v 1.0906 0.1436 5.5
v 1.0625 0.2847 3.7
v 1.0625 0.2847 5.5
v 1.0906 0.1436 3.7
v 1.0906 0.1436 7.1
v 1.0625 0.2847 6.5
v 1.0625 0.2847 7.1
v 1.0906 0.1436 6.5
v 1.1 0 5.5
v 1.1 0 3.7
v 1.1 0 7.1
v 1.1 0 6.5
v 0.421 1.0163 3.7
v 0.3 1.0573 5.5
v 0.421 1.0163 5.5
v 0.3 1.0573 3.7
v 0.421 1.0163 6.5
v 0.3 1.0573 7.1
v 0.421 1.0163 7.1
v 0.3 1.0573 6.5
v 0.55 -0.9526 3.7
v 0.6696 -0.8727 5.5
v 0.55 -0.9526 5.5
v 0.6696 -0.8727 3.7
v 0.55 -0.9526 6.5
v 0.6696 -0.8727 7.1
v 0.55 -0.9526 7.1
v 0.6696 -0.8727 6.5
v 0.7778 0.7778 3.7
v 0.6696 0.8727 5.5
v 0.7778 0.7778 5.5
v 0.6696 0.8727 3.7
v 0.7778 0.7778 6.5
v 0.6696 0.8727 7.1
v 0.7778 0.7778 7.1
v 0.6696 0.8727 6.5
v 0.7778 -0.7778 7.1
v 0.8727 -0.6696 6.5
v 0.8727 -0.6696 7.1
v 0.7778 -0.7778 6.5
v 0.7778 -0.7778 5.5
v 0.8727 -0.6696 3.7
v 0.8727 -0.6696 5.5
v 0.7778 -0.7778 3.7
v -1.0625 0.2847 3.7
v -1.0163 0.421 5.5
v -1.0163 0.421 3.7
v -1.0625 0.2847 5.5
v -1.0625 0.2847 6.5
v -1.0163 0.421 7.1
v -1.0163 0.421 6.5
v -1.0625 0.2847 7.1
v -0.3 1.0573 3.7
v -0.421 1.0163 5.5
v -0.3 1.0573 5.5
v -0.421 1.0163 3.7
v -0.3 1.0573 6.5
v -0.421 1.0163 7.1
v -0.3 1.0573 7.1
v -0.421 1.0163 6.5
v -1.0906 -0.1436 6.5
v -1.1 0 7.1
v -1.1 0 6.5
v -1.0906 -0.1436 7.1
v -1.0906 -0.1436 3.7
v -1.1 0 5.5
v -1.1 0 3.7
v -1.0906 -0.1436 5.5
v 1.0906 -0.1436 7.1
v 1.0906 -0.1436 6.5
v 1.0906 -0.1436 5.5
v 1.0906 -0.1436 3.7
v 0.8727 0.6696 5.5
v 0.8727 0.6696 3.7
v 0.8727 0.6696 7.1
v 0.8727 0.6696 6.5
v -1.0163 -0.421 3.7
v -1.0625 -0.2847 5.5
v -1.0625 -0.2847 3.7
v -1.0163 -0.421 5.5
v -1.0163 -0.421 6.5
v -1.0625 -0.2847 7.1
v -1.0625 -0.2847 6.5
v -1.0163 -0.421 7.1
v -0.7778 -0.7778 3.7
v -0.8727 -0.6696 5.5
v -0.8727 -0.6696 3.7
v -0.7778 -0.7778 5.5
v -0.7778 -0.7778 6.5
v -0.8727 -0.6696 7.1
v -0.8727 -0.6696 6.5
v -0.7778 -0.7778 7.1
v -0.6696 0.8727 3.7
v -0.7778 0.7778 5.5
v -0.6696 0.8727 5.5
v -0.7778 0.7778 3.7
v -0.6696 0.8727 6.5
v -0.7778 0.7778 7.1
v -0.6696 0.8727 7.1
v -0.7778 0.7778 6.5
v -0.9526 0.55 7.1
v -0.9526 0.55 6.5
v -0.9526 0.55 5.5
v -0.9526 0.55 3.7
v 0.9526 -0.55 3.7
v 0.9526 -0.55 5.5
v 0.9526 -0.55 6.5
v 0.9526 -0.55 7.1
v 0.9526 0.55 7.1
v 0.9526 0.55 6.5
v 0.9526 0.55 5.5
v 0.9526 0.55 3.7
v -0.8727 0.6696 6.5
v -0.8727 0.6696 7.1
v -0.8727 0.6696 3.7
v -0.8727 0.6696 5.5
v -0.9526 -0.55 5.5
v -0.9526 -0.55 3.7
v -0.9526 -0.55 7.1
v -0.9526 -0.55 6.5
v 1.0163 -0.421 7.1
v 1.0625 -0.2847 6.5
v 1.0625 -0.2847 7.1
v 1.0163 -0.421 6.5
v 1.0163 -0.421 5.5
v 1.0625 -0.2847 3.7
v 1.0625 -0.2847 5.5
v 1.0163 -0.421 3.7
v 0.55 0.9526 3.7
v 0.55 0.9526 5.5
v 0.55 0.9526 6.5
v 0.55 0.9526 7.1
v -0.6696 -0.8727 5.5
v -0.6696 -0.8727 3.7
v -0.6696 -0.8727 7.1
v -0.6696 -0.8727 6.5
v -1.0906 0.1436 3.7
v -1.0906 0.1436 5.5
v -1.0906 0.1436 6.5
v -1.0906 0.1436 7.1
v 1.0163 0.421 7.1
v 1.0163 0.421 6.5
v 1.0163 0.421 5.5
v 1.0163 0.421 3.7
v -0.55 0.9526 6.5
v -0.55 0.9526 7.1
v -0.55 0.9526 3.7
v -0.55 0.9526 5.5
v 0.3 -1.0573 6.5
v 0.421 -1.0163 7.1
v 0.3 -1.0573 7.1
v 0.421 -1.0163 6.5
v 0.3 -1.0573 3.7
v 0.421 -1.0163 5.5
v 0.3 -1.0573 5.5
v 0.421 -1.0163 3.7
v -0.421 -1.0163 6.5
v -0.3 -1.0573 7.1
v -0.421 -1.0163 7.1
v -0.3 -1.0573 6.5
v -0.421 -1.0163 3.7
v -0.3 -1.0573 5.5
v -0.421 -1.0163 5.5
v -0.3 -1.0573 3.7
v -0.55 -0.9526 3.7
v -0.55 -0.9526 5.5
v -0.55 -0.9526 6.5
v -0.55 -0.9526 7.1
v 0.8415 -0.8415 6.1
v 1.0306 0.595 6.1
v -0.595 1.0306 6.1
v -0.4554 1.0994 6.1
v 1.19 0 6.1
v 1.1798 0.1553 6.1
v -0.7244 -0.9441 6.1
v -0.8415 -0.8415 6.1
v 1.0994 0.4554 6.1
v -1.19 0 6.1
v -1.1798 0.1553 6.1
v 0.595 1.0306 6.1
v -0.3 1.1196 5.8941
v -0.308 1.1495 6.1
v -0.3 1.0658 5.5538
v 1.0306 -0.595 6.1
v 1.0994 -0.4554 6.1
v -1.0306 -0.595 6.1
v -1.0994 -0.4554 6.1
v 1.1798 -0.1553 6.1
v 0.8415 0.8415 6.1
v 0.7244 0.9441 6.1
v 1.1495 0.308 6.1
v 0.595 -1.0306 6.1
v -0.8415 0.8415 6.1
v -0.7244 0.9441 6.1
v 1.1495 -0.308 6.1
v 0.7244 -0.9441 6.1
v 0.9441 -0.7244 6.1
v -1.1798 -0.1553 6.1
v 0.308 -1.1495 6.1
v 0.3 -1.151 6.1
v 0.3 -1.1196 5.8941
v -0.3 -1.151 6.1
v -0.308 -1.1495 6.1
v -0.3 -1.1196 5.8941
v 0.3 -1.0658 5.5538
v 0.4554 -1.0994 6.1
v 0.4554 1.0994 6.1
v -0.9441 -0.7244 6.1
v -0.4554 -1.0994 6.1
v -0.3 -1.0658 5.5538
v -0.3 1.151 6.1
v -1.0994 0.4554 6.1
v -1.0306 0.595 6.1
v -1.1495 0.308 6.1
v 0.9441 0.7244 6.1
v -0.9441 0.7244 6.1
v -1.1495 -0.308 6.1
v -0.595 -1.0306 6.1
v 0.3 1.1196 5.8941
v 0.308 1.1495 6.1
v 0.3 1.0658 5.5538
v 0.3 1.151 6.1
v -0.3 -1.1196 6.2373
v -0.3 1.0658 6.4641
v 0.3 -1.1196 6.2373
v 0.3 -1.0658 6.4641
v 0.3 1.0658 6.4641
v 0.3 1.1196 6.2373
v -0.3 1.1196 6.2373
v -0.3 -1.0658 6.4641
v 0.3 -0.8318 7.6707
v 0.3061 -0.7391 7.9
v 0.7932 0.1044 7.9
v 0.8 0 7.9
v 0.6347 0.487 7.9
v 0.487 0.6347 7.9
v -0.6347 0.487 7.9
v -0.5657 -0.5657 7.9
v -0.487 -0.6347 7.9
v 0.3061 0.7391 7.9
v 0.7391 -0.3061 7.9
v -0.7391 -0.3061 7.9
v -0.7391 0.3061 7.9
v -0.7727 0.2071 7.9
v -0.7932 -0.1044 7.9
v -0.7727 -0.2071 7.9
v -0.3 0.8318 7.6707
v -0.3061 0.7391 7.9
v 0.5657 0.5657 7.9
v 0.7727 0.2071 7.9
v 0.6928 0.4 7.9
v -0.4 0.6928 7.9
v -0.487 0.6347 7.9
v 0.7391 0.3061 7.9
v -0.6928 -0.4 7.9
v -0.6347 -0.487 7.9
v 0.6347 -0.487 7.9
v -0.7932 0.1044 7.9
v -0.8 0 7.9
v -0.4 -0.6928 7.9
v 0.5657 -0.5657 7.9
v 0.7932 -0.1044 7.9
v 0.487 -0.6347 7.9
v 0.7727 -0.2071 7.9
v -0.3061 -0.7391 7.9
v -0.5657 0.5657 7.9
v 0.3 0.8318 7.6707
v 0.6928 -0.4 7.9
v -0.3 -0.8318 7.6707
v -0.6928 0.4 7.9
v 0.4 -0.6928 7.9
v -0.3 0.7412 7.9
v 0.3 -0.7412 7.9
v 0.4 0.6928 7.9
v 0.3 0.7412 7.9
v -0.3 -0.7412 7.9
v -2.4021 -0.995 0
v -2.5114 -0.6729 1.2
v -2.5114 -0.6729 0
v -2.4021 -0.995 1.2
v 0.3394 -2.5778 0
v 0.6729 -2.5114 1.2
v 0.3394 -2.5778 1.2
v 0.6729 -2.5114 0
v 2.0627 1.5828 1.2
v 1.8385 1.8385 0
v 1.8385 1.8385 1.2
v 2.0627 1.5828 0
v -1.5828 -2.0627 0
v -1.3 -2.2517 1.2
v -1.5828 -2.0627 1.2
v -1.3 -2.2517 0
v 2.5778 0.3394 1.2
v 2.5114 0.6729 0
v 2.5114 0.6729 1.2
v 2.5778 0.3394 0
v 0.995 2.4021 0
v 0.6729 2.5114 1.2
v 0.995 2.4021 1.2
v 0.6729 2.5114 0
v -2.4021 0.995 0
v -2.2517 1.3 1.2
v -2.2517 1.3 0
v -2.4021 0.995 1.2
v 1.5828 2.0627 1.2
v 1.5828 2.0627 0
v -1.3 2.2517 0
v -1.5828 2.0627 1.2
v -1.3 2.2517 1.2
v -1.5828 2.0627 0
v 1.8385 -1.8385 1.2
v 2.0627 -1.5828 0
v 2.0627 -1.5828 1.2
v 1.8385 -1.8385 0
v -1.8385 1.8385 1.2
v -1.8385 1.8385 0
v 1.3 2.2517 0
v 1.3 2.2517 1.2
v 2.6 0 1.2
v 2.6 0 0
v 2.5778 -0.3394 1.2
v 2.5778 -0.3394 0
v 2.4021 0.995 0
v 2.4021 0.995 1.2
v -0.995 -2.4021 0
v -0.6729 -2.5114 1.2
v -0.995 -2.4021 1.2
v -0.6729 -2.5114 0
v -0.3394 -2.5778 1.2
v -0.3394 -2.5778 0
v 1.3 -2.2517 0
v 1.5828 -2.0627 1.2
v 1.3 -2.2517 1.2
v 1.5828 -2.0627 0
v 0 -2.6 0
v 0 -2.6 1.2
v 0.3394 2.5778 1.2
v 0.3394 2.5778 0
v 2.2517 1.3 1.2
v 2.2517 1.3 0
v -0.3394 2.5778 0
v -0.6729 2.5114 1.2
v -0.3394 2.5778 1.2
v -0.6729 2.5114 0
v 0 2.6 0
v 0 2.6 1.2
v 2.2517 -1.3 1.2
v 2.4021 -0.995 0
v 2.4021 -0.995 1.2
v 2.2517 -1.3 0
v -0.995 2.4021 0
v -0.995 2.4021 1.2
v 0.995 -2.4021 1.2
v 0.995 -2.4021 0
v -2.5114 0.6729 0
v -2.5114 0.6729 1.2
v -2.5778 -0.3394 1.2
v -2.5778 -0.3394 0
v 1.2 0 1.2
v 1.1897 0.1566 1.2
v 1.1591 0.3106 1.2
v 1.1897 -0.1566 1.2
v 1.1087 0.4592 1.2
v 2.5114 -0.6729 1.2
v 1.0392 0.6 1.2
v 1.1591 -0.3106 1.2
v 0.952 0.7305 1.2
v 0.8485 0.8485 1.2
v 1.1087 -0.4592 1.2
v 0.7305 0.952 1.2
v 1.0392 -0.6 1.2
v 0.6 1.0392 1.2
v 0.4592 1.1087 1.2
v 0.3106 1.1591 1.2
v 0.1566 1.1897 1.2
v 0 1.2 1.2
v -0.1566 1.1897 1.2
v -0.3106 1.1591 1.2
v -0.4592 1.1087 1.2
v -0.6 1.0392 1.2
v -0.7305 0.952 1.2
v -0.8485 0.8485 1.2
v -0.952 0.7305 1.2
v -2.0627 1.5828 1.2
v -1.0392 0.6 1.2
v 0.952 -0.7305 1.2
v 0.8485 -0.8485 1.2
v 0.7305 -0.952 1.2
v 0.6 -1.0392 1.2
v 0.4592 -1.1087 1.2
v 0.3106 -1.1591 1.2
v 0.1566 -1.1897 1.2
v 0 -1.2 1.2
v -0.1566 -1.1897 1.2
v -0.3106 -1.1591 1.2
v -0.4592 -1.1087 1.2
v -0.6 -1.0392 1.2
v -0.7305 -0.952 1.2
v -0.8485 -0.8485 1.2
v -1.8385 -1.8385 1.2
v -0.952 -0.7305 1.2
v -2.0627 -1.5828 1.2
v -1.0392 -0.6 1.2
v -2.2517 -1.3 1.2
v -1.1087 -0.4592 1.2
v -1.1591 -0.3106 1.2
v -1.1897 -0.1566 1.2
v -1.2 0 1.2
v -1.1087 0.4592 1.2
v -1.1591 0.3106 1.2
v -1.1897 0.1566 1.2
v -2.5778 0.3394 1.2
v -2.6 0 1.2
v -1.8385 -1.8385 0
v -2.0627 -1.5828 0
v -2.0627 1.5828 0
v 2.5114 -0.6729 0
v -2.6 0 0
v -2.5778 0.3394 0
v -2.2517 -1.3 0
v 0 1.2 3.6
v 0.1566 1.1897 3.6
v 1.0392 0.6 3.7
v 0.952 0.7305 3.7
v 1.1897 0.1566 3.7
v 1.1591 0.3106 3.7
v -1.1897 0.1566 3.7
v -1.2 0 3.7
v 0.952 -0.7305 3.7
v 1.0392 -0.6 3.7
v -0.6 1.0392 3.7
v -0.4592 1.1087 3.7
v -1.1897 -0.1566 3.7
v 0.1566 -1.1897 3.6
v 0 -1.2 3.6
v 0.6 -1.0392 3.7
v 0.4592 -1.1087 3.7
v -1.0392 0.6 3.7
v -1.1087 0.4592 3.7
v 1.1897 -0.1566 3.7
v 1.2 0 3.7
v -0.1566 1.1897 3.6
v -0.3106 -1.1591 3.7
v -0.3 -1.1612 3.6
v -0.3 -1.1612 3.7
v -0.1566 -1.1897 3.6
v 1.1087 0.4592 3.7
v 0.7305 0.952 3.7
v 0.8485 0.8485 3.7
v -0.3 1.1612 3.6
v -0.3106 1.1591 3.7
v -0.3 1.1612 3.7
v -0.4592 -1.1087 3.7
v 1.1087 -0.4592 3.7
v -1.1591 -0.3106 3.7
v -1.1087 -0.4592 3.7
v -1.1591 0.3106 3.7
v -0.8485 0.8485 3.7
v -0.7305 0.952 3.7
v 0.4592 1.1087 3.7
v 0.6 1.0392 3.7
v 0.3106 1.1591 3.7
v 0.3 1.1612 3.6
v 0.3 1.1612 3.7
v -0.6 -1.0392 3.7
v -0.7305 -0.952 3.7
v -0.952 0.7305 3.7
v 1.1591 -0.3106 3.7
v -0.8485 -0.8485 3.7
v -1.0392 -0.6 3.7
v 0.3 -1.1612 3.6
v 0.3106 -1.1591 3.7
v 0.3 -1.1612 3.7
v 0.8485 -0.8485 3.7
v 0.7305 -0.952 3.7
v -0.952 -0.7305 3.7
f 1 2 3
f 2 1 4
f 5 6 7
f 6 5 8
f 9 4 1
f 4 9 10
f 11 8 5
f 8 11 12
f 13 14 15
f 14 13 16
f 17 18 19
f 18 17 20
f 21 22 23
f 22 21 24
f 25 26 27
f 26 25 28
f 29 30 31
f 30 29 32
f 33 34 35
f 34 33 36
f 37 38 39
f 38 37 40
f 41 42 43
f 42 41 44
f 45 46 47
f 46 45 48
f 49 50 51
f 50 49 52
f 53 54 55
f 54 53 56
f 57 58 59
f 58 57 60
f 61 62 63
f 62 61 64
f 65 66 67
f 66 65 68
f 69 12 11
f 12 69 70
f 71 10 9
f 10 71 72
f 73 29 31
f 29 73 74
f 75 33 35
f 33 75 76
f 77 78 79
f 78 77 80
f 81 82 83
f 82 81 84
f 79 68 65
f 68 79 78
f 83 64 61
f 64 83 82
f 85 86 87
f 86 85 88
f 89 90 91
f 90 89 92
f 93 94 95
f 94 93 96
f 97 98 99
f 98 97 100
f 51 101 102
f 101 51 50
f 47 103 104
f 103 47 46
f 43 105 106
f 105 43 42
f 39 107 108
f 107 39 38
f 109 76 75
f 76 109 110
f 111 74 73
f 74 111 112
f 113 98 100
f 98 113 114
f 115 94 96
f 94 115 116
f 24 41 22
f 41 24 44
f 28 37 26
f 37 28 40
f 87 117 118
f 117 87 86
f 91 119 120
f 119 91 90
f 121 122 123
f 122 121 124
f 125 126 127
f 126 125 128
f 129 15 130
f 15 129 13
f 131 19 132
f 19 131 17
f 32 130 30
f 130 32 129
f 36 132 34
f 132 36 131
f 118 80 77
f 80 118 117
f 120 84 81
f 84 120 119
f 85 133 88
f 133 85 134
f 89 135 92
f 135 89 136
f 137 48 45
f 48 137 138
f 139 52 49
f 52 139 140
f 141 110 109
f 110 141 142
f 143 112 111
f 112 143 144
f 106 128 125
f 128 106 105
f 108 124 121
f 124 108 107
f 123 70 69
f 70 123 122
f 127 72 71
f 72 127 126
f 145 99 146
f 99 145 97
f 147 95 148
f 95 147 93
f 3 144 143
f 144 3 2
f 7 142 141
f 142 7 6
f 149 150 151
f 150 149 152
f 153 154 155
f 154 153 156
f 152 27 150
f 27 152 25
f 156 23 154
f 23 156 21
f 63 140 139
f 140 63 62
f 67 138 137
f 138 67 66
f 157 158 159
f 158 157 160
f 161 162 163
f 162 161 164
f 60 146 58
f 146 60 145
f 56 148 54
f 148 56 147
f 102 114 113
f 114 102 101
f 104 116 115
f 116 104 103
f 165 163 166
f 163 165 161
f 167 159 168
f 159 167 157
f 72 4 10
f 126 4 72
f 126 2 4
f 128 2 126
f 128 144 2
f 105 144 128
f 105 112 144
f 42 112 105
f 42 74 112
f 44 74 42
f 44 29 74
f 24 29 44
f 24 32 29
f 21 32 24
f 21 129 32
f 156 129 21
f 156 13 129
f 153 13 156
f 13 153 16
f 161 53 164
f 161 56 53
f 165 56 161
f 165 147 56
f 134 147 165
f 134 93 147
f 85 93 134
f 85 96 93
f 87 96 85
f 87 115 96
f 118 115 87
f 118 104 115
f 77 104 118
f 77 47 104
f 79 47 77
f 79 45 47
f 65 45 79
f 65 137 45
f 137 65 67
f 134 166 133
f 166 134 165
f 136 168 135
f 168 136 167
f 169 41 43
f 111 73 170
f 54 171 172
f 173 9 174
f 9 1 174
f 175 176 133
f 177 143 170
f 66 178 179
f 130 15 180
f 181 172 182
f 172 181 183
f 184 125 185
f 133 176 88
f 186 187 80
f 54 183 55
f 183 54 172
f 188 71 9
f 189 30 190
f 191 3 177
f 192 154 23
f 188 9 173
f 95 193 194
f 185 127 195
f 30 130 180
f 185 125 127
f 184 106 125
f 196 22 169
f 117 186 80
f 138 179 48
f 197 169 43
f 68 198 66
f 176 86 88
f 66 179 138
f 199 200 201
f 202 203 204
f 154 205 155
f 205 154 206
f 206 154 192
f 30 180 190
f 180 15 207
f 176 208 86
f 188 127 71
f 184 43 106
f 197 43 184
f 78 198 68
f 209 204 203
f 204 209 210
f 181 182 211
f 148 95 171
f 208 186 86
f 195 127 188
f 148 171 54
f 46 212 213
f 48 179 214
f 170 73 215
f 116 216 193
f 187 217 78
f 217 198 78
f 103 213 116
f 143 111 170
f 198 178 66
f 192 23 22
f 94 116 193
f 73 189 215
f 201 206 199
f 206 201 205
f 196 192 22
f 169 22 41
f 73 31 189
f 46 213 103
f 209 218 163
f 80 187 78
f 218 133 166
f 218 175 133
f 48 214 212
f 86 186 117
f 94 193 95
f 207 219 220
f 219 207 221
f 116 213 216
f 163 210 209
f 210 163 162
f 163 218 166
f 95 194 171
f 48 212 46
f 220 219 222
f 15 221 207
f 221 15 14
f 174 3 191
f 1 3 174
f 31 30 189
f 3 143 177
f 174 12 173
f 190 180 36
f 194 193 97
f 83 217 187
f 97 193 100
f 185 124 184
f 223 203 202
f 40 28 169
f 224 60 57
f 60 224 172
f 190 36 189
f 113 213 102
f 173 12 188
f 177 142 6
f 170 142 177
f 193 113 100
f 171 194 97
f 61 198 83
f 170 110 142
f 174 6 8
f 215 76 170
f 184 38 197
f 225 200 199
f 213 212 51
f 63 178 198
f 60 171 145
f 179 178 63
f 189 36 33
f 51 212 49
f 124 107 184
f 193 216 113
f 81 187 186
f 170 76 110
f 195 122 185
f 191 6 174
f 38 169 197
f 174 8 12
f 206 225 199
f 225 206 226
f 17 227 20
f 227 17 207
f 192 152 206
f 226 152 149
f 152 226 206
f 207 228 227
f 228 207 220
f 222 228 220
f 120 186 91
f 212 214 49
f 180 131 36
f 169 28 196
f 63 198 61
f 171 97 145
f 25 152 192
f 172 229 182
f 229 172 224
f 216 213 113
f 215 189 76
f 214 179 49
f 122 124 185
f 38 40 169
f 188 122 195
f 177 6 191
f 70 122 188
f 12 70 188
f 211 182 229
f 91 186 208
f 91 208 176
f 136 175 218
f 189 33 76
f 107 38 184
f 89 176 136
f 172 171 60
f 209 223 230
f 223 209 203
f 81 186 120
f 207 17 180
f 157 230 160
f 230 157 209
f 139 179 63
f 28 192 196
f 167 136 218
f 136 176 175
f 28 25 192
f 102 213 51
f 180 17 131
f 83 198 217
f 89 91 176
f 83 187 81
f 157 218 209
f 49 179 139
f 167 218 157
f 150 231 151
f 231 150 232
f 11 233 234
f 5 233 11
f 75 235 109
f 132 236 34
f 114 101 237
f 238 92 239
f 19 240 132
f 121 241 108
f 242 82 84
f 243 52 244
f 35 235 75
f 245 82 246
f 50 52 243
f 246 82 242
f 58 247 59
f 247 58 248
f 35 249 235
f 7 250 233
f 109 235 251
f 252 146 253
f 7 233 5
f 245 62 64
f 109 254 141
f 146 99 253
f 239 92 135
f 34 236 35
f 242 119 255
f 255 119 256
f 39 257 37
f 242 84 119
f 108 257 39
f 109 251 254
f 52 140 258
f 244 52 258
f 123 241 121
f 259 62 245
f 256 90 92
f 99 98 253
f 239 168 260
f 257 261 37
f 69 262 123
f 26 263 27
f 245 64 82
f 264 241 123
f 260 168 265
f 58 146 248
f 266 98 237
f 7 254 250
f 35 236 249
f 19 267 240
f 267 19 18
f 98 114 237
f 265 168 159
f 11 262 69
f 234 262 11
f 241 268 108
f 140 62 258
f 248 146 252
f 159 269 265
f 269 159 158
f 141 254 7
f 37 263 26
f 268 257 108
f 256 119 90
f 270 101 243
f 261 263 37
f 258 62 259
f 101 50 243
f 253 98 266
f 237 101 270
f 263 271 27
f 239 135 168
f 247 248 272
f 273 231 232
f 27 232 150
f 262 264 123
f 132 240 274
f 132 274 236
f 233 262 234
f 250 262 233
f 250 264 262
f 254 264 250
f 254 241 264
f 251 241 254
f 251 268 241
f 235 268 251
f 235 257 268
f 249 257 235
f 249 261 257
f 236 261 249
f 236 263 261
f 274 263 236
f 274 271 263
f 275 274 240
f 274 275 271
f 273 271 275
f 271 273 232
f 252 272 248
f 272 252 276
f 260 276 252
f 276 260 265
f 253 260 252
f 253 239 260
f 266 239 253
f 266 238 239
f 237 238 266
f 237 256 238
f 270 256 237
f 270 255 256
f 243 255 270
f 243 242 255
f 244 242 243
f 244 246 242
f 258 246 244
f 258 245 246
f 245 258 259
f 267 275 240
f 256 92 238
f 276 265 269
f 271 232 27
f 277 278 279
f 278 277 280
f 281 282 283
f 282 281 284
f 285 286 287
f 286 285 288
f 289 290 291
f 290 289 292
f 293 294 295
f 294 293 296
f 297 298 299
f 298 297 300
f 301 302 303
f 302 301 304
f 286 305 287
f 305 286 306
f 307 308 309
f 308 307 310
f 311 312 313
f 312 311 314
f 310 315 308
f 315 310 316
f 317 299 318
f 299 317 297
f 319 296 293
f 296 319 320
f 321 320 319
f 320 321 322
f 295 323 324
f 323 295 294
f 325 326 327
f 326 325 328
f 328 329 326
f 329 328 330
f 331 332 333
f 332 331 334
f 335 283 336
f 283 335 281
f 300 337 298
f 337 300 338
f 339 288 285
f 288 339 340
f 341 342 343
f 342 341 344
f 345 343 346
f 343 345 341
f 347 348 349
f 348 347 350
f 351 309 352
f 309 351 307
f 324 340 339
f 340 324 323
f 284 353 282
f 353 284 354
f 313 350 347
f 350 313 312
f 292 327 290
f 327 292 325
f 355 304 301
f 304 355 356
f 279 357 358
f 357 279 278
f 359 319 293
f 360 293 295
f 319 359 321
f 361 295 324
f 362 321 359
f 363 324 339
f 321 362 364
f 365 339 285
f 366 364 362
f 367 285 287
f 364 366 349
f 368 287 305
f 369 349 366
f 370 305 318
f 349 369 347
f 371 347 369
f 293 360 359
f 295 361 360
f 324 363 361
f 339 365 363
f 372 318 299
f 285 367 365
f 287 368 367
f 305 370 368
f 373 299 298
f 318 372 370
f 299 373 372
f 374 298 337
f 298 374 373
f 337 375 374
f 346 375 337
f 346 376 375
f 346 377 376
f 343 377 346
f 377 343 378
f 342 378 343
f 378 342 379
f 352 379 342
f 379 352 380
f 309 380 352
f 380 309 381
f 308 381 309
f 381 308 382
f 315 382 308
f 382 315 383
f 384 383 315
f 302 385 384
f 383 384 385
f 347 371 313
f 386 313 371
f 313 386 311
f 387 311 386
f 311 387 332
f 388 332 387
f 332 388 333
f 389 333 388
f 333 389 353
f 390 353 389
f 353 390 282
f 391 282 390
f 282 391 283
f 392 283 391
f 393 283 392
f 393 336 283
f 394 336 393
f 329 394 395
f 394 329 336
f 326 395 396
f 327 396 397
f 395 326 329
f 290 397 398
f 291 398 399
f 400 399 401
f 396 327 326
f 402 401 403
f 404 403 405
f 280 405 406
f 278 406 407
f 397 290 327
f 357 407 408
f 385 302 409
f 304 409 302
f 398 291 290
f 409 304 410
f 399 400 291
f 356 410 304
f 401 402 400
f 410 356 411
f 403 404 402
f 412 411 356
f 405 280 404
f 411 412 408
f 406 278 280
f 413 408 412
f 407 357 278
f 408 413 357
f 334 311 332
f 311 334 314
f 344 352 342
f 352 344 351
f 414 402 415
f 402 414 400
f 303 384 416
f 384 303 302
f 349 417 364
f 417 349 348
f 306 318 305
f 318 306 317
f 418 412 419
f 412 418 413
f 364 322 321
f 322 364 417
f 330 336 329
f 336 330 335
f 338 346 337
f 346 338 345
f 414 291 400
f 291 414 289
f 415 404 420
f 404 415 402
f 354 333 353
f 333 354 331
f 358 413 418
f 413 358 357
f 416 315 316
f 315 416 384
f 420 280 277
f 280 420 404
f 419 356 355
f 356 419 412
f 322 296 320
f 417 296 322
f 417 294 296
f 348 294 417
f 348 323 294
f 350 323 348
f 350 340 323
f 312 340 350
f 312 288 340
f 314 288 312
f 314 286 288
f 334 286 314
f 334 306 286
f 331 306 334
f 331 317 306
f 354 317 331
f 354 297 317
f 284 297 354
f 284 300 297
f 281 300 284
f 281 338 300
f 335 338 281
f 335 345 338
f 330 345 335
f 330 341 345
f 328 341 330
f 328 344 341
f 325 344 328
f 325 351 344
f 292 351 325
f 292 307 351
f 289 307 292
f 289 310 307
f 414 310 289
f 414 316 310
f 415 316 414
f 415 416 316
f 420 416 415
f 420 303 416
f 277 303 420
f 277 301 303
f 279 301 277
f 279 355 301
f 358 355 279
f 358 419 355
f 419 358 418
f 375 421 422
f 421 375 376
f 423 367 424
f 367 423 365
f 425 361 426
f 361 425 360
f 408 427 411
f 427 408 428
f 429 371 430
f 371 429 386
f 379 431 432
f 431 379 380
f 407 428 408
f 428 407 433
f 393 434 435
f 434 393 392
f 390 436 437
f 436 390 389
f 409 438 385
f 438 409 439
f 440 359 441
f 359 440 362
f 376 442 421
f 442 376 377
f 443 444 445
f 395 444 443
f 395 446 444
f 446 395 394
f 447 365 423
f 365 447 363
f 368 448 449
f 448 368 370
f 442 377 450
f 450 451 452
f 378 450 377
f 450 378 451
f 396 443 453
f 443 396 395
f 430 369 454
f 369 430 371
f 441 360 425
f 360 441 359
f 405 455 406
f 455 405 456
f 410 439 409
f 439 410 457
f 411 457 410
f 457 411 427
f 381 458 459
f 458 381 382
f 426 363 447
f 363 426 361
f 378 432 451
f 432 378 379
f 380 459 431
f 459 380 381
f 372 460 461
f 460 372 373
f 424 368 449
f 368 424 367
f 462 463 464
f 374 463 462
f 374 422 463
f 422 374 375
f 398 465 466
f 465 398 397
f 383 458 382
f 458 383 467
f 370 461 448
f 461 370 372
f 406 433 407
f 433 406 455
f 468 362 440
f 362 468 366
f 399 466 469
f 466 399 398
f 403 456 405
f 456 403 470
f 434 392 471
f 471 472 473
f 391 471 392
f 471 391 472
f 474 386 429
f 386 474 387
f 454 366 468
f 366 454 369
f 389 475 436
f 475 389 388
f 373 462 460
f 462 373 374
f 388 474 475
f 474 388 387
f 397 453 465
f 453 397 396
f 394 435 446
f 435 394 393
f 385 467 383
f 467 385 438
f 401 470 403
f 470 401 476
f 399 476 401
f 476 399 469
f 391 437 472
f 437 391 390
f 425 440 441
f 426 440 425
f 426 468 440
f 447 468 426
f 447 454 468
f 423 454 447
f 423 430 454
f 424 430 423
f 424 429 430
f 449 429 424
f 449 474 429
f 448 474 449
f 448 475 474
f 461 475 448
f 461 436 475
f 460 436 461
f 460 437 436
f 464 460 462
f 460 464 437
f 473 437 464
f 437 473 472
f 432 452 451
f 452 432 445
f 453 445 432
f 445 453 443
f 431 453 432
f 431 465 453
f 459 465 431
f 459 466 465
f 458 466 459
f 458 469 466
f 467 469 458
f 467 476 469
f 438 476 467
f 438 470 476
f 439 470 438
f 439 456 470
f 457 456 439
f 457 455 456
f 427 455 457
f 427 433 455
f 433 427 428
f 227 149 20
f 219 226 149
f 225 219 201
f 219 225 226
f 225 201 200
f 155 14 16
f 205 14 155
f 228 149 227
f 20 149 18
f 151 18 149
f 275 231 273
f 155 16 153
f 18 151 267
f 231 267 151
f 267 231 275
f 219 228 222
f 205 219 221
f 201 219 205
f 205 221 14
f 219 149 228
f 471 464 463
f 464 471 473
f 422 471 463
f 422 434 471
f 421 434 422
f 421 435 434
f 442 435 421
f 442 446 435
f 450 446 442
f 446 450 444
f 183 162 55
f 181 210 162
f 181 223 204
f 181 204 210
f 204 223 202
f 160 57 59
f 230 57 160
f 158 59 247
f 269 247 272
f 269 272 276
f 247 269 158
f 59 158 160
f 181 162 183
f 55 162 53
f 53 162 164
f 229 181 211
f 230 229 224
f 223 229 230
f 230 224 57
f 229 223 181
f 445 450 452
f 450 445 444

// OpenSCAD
// ====================================================================
// Modular Rotor Axle Pin & Retaining Cap
// Precision bearing pin for low-friction rotation of the main rotor.
//
// Engineering Specifications:
// - Cap Head: 5.2mm diameter x 1.2mm height with chamfered top
// - Bearing Spindle: 2.4mm diameter x 2.5mm length (matches 2.8mm rotor bore)
//   -> 0.4mm diametral clearance ensures free, low-friction spin
//   -> 0.3mm axial play prevents vertical pinching
// - Anchor Stem: 2.2mm diameter x 4.2mm length with retention barb
// - Central compliance slit (0.6mm) enables spring-loaded snap retention
// - 100% supportless vertical print grounded on flat cap head (Z = 0)
// ====================================================================

$fn = 48;

cap_d     = 5.2;
cap_h     = 1.2;
journal_d = 2.4;
journal_h = 2.5;
stem_d    = 2.2;
stem_h    = 4.2;
barb_d    = 2.38; // Slight snap-retaining barb

module rotor_axle_pin() {
    difference() {
        union() {
            // 1. Cap Head (grounded at Z = 0)
            cylinder(d = cap_d, h = cap_h, center = false);
            // Cap chamfer
            translate([0, 0, cap_h - 0.3])
                cylinder(d1 = cap_d, d2 = cap_d - 0.6, h = 0.3, center = false);

            // 2. Bearing Spindle Journal (smooth rotation surface)
            translate([0, 0, cap_h])
                cylinder(d = journal_d, h = journal_h, center = false);

            // 3. Anchor Stem
            translate([0, 0, cap_h + journal_h]) {
                // Shaft
                cylinder(d = stem_d, h = stem_h - 0.8, center = false);

                // Retention barb ring
                translate([0, 0, 1.8])
                    cylinder(d1 = stem_d, d2 = barb_d, h = 0.6, center = false);
                translate([0, 0, 2.4])
                    cylinder(d1 = barb_d, d2 = stem_d, h = 0.4, center = false);

                // Lead-in chamfer at tip for easy insertion
                translate([0, 0, stem_h - 0.8])
                    cylinder(d1 = stem_d, d2 = stem_d - 0.6, h = 0.8, center = false);
            }
        }

        // Longitudinal compliance slot in stem (spring-loaded snap action)
        translate([0, 0, cap_h + journal_h + stem_h/2])
            cube([0.6, stem_d + 1.0, stem_h + 0.2], center = true);
    }
}

// Standalone print orientation: Head flat on bed at Z = 0
rotor_axle_pin();
